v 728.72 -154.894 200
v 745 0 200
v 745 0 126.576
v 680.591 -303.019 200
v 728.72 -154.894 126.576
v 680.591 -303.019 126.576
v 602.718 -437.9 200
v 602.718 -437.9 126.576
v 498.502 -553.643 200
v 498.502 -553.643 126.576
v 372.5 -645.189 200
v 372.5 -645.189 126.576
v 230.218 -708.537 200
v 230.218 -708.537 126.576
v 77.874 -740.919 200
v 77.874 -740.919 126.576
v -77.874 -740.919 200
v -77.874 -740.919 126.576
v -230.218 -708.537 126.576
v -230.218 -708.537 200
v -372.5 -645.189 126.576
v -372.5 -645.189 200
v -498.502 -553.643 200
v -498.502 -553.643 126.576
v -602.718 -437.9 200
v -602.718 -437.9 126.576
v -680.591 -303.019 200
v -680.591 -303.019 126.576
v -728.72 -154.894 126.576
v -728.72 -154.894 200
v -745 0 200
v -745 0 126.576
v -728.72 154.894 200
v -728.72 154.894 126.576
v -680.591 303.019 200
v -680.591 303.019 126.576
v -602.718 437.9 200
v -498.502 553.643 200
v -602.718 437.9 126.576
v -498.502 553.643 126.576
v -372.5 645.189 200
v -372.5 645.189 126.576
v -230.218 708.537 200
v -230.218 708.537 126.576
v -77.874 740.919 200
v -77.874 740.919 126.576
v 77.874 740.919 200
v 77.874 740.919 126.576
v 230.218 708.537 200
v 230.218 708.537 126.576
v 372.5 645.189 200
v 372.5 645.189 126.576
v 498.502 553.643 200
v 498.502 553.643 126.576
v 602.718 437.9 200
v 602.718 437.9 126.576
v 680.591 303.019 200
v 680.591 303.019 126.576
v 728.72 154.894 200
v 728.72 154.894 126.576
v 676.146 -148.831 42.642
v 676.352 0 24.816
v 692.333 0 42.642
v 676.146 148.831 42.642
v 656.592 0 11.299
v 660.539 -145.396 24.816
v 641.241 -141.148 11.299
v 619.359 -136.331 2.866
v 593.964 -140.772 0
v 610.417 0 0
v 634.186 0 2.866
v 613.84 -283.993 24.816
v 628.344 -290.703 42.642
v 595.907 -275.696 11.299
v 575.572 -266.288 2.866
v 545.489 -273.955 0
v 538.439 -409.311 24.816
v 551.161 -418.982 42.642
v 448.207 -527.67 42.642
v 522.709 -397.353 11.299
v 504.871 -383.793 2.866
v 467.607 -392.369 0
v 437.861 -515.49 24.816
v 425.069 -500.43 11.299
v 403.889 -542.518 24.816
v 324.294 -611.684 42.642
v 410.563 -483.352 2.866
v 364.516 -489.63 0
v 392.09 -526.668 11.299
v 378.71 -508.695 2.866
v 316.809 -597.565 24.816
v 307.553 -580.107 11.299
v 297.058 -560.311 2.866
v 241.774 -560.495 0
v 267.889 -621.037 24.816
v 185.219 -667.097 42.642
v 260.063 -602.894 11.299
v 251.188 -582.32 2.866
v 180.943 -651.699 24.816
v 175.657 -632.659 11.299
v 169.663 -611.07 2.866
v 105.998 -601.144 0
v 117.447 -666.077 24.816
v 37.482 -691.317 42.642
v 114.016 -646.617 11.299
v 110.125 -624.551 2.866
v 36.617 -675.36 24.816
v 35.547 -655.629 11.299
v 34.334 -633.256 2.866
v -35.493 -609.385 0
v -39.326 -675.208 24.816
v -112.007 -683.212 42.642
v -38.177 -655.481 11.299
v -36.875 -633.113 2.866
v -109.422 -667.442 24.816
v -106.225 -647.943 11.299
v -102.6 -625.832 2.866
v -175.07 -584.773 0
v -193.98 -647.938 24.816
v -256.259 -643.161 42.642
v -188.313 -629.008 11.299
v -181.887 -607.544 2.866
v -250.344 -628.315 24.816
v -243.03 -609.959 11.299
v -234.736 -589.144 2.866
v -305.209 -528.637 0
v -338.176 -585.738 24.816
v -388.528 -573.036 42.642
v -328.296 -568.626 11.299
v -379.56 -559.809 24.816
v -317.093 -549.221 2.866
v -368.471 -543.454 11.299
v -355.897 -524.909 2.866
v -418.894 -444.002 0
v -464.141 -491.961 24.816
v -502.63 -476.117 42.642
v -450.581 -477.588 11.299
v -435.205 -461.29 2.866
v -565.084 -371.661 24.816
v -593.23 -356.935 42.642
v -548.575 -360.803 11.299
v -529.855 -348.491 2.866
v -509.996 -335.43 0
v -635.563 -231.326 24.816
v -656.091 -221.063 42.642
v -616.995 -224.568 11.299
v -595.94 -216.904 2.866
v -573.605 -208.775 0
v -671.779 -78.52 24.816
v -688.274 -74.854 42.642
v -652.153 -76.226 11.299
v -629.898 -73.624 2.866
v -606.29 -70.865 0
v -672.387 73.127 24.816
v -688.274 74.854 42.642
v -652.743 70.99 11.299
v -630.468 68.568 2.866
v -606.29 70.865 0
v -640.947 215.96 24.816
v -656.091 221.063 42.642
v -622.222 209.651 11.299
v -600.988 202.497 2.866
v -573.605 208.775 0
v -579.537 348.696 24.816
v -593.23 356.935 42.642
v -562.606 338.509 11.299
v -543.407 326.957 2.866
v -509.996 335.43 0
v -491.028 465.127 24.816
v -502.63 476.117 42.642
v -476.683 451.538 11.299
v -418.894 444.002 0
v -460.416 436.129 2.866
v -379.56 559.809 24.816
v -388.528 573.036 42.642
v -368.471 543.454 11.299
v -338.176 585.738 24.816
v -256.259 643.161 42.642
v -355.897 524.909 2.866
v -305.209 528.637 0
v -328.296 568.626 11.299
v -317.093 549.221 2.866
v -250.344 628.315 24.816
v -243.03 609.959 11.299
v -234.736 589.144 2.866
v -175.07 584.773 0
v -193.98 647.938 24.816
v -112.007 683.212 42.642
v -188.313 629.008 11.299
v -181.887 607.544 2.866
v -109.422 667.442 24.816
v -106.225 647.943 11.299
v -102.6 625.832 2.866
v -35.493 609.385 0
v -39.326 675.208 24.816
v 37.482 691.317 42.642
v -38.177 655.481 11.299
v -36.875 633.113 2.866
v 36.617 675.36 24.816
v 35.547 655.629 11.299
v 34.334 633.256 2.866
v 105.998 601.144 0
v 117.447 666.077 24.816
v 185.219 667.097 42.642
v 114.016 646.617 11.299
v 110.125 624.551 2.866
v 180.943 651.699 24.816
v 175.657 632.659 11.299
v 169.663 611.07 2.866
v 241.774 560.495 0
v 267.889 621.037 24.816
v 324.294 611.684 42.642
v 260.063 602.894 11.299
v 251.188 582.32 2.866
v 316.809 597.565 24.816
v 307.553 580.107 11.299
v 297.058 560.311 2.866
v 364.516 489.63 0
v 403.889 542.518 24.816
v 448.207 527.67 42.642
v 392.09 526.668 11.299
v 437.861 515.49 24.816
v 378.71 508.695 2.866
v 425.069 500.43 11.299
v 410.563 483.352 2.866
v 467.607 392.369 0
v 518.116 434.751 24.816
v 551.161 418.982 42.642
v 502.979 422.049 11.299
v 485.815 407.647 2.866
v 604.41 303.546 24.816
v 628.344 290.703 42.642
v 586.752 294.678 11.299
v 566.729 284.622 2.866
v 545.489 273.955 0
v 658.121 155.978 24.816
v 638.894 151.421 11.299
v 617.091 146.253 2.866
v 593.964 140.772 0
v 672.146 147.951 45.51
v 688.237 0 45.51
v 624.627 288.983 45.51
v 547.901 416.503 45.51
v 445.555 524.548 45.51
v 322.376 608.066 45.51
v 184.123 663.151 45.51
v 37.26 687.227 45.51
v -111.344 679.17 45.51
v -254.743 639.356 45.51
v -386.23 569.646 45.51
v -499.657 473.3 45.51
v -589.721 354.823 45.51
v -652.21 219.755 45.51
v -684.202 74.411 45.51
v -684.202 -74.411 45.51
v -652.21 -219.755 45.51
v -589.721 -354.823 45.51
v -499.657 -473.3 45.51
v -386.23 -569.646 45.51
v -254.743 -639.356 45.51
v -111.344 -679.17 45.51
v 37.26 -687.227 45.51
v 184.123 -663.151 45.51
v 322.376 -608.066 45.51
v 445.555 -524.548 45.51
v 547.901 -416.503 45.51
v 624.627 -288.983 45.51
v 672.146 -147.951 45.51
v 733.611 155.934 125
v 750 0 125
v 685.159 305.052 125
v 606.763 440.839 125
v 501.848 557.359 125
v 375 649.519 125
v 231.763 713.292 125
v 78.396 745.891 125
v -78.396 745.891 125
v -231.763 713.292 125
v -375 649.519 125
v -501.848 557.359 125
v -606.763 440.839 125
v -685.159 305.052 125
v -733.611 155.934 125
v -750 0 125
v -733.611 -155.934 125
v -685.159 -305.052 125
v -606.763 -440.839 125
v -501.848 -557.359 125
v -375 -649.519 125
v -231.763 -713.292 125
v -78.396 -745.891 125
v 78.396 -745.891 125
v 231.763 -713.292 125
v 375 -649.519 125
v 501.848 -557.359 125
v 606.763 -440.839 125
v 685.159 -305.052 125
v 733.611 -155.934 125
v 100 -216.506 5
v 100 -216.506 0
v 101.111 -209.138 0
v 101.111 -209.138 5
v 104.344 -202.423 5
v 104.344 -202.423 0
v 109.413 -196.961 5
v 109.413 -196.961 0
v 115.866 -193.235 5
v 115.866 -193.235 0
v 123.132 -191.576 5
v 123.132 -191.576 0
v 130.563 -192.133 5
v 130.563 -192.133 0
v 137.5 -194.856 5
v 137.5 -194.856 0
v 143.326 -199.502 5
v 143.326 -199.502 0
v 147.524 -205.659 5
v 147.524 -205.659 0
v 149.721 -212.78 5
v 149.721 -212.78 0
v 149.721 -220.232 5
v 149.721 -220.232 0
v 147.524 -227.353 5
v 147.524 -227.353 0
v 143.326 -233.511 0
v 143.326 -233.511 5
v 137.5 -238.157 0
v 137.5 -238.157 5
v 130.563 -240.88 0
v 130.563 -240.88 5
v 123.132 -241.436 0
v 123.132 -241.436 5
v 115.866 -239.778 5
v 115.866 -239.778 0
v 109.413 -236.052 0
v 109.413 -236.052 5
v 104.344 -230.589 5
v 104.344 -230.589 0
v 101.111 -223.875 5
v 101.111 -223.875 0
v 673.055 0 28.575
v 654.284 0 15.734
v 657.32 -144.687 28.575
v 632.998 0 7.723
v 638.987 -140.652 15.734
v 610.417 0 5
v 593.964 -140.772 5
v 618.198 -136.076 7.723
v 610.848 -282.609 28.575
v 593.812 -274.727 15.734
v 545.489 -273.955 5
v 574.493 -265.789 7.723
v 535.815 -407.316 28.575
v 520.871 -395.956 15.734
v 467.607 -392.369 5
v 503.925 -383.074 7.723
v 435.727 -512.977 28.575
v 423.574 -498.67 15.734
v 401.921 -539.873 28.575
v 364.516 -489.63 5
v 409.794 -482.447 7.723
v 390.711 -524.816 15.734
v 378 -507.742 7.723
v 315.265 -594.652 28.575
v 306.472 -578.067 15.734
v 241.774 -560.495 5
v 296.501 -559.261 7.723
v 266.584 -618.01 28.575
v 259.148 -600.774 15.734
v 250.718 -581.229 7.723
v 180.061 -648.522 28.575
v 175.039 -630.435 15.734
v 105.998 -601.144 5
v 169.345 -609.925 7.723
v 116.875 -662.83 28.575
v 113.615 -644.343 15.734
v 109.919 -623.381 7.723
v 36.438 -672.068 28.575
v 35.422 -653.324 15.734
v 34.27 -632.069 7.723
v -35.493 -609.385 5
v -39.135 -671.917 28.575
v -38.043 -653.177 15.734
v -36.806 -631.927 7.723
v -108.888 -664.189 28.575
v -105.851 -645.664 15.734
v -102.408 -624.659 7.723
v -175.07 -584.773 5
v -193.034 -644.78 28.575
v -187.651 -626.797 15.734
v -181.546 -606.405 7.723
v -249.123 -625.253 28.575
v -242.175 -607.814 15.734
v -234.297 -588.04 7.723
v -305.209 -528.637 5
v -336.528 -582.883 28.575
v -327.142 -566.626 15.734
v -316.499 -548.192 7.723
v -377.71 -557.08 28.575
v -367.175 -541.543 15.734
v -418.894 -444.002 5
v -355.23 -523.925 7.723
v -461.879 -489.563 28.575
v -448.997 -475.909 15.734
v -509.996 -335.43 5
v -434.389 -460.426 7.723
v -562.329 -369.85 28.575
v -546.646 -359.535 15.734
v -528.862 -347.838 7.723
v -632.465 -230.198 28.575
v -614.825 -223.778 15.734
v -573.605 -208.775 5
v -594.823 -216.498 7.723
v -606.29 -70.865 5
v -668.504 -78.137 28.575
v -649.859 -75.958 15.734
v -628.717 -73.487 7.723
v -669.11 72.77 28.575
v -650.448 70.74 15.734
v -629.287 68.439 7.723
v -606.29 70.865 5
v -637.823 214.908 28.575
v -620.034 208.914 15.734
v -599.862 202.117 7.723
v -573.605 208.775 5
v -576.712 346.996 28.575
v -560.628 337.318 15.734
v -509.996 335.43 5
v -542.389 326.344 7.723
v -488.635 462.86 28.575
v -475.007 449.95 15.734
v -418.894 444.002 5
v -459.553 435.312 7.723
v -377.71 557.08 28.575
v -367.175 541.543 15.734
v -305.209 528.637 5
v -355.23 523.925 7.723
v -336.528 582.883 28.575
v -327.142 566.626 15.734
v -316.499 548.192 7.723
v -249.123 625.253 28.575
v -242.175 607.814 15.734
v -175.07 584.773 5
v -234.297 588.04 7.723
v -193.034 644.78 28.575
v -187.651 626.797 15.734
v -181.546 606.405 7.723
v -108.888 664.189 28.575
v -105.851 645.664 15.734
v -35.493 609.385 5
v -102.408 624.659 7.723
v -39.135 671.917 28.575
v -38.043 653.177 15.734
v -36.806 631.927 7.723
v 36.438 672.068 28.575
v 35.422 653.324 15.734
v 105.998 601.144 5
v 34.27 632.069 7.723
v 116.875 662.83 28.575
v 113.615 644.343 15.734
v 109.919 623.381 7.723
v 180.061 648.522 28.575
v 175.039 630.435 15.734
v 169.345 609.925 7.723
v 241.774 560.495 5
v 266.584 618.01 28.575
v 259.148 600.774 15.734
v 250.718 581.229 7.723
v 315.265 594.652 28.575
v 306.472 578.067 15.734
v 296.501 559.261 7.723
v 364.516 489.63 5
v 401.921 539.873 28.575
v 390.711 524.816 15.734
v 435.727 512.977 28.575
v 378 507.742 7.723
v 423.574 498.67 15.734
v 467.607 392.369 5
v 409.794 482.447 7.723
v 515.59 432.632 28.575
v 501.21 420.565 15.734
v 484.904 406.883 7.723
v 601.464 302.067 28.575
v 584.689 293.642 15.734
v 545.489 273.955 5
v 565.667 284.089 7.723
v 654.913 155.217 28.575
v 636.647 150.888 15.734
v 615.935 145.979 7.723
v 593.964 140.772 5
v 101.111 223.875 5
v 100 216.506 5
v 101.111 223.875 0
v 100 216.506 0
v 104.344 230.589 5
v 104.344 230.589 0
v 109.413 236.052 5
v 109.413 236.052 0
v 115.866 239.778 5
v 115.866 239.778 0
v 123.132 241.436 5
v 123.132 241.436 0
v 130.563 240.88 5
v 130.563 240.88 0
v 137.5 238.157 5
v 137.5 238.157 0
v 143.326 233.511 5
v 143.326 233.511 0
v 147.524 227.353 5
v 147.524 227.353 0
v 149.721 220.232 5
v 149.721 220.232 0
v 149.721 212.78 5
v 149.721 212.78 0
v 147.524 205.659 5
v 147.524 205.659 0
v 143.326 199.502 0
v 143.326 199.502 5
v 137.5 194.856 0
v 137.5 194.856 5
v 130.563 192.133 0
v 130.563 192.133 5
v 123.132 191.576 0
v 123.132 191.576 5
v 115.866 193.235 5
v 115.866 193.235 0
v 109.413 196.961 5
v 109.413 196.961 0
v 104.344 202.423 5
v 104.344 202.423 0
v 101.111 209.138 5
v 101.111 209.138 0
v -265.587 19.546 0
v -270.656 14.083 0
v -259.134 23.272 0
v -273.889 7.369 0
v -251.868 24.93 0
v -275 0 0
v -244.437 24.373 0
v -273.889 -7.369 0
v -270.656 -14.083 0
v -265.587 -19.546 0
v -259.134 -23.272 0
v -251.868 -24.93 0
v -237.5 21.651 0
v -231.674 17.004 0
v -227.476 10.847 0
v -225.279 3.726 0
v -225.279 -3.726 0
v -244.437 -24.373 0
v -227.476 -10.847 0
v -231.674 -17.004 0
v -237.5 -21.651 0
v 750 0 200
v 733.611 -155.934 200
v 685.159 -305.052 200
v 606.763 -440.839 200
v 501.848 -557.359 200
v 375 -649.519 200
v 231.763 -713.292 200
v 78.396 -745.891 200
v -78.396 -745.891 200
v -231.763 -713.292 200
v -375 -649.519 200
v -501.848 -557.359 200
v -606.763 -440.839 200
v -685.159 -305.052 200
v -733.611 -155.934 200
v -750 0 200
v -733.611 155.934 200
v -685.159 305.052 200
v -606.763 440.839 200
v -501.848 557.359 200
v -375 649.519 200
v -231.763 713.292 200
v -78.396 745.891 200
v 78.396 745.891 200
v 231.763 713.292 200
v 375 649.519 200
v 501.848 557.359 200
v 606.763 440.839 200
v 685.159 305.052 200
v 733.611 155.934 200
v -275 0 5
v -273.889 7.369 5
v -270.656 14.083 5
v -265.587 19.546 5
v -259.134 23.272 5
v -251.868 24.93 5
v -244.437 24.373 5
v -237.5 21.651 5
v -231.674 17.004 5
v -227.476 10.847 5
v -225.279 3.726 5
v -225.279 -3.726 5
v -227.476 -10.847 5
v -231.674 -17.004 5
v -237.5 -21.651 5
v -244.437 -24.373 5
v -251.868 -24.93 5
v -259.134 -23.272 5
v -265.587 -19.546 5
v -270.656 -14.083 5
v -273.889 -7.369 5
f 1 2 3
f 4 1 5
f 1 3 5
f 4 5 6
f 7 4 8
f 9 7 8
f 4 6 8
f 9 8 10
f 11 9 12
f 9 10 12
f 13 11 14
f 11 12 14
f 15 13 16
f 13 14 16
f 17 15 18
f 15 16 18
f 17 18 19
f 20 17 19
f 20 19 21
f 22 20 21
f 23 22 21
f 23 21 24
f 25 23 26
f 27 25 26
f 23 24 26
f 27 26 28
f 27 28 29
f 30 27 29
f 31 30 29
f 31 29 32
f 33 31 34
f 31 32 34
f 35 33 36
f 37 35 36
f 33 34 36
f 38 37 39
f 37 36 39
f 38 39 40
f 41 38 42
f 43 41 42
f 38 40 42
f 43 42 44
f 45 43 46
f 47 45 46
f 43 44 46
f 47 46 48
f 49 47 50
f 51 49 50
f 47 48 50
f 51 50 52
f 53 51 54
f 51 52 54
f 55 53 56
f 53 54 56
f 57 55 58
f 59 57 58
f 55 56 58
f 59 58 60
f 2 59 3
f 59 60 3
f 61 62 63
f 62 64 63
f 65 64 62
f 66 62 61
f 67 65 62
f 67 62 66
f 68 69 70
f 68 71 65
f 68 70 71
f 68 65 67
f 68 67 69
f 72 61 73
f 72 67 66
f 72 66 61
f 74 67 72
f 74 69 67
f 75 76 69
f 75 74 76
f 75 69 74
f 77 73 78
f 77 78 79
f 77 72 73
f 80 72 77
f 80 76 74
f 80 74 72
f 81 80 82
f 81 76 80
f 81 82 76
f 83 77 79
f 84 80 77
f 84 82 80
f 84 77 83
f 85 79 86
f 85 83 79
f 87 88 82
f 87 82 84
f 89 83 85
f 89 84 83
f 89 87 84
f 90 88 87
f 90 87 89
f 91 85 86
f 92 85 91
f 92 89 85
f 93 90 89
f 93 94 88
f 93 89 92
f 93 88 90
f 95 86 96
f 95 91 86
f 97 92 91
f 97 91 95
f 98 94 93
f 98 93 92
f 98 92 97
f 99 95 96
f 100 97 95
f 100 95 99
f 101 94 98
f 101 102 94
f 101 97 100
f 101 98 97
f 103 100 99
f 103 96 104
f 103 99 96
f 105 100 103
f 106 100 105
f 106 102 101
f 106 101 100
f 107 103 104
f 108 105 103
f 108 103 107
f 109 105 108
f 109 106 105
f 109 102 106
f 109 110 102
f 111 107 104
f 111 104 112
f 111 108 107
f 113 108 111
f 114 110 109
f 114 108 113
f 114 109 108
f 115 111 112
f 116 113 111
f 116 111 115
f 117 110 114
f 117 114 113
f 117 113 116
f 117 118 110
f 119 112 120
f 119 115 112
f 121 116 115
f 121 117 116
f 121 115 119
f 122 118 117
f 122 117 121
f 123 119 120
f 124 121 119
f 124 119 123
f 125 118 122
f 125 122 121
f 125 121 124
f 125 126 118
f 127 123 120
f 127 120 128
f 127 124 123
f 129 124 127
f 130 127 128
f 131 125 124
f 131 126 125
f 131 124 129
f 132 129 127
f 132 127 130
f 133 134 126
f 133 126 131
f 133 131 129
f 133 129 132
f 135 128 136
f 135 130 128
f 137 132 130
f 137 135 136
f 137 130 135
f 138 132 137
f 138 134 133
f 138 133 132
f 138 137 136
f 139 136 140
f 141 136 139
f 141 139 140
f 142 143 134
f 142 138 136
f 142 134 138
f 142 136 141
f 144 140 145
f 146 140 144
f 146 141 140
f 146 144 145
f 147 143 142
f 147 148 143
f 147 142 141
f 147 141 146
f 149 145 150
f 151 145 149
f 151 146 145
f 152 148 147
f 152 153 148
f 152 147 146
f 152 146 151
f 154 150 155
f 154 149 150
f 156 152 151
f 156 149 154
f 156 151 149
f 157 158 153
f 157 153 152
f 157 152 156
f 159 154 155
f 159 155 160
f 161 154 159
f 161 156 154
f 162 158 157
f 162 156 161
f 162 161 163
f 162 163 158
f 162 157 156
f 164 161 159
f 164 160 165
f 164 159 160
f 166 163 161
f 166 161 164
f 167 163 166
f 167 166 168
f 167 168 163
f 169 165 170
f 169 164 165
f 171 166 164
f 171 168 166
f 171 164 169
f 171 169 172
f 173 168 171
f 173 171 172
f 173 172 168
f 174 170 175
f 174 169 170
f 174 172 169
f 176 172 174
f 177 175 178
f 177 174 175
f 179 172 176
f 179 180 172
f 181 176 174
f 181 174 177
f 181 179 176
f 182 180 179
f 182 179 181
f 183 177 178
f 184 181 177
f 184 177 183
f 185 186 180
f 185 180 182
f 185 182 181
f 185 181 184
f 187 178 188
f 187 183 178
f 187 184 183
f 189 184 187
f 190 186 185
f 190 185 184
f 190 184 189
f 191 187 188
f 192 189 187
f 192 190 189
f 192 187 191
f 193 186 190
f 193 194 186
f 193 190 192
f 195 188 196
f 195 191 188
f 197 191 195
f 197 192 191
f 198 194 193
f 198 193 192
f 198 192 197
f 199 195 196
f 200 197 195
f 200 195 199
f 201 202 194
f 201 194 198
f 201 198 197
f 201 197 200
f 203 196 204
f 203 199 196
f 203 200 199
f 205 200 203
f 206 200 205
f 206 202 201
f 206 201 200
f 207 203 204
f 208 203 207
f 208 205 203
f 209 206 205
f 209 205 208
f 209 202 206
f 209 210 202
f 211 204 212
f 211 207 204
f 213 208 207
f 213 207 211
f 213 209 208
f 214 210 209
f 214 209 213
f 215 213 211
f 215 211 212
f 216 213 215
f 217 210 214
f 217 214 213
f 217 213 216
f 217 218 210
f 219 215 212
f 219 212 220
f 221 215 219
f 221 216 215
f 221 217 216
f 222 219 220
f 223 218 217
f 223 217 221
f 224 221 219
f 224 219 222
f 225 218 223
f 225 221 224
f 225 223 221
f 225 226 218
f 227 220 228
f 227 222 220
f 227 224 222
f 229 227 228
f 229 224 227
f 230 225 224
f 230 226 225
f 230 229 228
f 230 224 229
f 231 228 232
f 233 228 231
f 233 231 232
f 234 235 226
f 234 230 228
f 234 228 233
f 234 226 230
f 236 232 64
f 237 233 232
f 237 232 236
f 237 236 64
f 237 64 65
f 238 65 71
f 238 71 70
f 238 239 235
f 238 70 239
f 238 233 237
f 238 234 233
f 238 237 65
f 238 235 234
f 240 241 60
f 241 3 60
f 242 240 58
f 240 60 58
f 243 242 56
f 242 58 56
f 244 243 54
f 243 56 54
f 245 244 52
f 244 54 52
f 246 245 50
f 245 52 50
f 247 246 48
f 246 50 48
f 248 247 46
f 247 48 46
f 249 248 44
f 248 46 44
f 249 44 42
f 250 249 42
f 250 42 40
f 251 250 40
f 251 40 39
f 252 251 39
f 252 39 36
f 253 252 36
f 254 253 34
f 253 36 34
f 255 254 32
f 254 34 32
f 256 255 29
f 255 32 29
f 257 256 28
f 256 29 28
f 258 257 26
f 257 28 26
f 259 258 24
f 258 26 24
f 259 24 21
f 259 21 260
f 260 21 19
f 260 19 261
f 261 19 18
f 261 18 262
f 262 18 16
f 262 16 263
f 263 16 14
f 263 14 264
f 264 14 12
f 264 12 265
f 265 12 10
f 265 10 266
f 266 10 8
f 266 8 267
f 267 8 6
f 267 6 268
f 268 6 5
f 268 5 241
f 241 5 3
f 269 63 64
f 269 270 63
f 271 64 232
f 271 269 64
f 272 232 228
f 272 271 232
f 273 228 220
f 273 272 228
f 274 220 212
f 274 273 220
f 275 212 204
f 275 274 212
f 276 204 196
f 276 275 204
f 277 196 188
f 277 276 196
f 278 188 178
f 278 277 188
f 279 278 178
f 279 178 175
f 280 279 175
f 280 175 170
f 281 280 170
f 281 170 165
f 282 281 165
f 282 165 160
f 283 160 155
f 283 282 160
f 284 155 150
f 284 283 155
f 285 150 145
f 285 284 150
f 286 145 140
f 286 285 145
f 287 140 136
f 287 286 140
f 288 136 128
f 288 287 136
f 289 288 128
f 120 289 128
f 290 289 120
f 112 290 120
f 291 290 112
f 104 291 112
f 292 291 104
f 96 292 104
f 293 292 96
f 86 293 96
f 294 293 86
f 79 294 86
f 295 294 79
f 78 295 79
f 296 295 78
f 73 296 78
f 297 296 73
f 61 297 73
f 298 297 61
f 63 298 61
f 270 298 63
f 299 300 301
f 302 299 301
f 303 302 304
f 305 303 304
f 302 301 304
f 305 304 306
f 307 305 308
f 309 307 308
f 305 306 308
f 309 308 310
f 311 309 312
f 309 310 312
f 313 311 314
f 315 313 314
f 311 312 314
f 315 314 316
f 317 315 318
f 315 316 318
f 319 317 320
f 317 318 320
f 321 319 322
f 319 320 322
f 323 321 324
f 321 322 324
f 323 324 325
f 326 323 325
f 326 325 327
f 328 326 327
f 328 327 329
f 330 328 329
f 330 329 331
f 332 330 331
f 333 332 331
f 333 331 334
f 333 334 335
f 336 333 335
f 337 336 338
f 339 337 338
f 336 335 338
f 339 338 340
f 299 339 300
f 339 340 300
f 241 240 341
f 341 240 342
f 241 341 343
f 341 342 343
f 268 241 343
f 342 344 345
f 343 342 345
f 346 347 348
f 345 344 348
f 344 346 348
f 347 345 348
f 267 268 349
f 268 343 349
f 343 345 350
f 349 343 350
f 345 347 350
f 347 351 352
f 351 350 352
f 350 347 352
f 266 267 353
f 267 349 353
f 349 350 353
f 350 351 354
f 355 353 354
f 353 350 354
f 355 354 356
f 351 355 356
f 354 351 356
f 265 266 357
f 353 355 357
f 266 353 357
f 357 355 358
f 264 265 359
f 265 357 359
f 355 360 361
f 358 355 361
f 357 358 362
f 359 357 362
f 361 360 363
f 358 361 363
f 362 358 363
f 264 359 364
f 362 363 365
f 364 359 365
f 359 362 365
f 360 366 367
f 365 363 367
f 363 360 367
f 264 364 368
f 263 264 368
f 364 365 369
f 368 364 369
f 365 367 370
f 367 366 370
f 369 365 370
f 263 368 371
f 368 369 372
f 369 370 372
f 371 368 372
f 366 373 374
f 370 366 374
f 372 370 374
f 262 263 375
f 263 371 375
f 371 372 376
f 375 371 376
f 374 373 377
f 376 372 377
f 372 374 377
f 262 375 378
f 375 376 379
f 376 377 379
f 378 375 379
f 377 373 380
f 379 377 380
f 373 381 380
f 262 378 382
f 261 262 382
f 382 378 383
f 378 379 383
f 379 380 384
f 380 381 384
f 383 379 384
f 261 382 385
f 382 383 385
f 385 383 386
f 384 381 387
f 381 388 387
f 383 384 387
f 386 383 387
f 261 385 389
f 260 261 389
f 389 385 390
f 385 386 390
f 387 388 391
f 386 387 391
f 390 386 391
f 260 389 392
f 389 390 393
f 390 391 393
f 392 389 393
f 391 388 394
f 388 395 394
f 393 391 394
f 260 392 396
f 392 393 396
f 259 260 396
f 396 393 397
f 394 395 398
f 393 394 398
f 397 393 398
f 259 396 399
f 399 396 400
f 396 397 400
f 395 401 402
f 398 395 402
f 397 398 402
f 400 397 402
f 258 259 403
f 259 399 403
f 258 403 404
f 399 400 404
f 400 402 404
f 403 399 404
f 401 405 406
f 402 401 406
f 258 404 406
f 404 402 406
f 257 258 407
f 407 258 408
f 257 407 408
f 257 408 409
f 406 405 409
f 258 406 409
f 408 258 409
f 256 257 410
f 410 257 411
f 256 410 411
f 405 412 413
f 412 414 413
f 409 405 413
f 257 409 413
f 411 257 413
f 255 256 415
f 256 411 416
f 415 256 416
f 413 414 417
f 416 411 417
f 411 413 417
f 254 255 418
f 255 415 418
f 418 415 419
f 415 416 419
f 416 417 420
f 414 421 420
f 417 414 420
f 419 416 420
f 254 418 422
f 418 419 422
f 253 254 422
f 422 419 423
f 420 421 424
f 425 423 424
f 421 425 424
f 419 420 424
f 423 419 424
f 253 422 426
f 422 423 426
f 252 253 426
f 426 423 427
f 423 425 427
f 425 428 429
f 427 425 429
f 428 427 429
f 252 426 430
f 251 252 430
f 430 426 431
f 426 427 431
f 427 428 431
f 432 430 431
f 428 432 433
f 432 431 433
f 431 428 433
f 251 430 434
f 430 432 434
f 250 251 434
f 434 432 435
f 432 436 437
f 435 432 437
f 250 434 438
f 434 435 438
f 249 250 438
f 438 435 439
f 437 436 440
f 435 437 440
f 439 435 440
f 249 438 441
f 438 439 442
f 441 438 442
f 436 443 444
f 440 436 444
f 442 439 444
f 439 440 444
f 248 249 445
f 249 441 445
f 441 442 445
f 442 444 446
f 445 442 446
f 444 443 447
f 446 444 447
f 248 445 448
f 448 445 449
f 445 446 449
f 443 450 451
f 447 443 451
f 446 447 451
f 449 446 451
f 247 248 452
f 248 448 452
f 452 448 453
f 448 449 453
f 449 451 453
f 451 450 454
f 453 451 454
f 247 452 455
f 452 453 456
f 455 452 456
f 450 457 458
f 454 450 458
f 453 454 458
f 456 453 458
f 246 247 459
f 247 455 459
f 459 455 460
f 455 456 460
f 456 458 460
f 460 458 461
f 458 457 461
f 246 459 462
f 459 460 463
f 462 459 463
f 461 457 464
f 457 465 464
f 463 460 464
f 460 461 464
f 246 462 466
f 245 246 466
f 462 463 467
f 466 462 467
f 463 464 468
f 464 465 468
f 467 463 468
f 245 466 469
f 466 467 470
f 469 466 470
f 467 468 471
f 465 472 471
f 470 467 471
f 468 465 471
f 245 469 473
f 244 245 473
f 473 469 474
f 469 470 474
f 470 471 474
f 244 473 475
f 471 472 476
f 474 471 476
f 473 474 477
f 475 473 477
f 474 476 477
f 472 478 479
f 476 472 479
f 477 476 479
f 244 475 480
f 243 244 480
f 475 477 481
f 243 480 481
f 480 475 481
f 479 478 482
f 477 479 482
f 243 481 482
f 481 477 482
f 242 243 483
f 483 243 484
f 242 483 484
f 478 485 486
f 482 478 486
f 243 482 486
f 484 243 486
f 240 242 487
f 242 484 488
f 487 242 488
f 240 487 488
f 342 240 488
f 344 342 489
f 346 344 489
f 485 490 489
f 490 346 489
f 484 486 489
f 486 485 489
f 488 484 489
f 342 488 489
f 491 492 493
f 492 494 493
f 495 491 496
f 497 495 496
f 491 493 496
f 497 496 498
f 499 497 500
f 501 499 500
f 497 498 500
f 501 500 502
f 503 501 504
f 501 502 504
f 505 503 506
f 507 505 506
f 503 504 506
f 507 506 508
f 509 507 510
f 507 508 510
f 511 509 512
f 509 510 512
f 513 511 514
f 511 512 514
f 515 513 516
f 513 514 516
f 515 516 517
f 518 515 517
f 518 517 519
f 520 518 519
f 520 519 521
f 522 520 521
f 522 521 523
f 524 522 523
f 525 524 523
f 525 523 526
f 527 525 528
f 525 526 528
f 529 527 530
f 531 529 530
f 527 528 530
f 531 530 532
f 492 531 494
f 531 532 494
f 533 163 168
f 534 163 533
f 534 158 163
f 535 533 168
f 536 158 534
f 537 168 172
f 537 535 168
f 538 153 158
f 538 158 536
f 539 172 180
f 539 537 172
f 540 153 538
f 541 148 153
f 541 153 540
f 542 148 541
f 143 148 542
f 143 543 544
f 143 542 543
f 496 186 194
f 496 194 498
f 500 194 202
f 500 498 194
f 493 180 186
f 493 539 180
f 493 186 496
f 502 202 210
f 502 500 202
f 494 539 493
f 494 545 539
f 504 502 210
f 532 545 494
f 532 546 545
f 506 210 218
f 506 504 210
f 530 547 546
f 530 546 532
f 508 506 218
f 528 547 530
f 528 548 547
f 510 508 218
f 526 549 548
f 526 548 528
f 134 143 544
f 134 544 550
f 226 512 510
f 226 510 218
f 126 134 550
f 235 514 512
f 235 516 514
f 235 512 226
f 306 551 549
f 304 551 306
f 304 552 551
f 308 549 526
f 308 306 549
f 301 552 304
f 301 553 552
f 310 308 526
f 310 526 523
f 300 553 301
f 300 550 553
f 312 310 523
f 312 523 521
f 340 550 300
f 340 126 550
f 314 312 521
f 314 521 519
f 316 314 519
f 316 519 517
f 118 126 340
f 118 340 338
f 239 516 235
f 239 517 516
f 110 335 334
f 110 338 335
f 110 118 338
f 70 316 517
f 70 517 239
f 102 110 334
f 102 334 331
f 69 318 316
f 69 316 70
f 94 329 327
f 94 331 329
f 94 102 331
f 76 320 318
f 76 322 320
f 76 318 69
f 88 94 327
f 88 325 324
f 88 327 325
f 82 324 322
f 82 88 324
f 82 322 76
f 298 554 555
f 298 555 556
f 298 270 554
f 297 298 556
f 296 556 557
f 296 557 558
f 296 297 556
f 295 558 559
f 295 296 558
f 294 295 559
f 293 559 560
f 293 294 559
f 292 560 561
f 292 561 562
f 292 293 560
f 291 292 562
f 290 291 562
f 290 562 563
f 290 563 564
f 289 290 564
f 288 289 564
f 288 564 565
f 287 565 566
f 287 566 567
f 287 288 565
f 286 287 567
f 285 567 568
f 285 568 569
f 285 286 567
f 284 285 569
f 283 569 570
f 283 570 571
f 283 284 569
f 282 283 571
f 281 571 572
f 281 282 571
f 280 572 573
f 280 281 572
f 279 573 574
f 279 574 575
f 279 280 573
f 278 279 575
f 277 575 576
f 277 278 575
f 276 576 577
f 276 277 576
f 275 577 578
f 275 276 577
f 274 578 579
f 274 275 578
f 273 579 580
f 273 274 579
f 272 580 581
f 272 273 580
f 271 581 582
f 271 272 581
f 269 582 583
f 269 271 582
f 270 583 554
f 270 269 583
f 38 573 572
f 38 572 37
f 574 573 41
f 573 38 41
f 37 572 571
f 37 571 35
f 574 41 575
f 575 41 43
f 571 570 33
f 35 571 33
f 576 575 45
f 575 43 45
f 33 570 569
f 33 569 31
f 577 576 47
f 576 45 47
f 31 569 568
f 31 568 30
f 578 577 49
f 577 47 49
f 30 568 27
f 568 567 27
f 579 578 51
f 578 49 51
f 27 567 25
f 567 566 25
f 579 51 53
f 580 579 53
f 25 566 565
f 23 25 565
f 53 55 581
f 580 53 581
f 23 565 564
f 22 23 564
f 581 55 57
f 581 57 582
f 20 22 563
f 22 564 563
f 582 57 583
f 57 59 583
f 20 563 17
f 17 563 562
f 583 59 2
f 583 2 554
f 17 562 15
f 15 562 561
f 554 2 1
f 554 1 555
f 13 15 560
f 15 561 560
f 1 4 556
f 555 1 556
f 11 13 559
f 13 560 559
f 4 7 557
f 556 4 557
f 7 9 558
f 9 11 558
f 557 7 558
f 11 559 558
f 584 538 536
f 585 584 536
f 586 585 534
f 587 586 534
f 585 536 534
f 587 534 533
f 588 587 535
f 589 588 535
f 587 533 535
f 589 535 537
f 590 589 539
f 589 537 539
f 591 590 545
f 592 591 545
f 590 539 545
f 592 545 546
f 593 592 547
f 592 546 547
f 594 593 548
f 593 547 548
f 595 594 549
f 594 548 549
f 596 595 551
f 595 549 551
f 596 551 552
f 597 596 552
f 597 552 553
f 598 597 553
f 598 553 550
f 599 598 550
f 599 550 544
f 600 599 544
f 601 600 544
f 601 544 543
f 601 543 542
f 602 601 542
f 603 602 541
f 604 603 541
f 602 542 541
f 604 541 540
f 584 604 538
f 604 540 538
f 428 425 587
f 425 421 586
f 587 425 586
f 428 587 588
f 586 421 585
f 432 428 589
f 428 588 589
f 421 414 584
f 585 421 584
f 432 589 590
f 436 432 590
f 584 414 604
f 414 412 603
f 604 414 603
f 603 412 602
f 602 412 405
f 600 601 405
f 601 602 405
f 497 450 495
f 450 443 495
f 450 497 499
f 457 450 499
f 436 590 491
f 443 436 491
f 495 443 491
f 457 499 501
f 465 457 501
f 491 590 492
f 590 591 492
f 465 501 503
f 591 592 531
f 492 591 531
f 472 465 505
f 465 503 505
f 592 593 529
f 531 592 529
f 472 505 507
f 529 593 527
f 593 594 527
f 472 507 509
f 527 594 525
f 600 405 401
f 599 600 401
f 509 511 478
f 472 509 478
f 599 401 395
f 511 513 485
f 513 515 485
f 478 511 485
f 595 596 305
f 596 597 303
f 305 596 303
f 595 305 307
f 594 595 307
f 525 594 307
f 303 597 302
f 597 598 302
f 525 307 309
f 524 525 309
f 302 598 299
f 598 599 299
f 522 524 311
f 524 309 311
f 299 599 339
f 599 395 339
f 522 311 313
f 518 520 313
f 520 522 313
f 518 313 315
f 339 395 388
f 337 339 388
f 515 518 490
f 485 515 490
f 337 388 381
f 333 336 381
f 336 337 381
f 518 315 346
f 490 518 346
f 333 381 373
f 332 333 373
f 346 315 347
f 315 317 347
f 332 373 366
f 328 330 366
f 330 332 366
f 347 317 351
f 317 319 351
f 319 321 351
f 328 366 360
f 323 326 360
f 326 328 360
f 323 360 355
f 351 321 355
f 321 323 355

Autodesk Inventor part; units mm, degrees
ref_plane "YZ Plane" through (0, 0, 0) normal (1, 0, 0) x (0, 1, 0)
ref_plane "XZ Plane" through (0, 0, 0) normal (0, 1, 0) x (-1, 0, 0)
ref_plane "XY Plane" through (0, 0, 0) normal (0, 0, 1) x (1, 0, 0)
sketch "Sketch2" plane through (0, 0, 0) normal (0, 1, 0) x (-1, 0, 0)
  line L0 (0, 0) -> (-610.4174, 0)
  line L1 (-692.3326, 42.6424) -> (-750, 125)
  line L2 (-750, 200) -> (0, 200)
  line L3 (0, 200) -> (0, 0)
  arc A0 (-692.3326, 42.6424) -> (-610.4174, 0) centre (-610.4174, 100) ccw
  line L4 (-750, 200) -> (-750, 125)
  dimension "d0" = 100
  dimension "d1" = 200
  dimension "d2" = 750
  dimension "d3" = 125
  dimension "d4" = 75
revolve "Revolution1" add sketch "Sketch2" angle 360 about axis through (0, 0, 200) along (0, 0, -1)
shell "Shell1" thickness 5 removed faces 1 at (-44.9023, -186.6904, 200)
sketch "Sketch4" plane through (0, 0, 0) normal (0, 0, -1) x (-1, 0, 0)
  line L0 (1050, 0) -> (-1050, 0) construction
  line L1 (0, -1050) -> (0, 1050) construction
  circle A0 centre (-125, -216.5064) radius 25
  line L2 (-125, -216.5064) -> (0, 0) construction
  circle A1 centre (250, 0) radius 25
  circle A2 centre (-125, 216.5064) radius 25
  dimension "d8" = 50
  dimension "d9" = 60
  dimension "d10" = 250
  dimension "d13" = 360
extrude "Extrusion1" cut sketch "Sketch4" against normal through all
properties part number "Saucer"
